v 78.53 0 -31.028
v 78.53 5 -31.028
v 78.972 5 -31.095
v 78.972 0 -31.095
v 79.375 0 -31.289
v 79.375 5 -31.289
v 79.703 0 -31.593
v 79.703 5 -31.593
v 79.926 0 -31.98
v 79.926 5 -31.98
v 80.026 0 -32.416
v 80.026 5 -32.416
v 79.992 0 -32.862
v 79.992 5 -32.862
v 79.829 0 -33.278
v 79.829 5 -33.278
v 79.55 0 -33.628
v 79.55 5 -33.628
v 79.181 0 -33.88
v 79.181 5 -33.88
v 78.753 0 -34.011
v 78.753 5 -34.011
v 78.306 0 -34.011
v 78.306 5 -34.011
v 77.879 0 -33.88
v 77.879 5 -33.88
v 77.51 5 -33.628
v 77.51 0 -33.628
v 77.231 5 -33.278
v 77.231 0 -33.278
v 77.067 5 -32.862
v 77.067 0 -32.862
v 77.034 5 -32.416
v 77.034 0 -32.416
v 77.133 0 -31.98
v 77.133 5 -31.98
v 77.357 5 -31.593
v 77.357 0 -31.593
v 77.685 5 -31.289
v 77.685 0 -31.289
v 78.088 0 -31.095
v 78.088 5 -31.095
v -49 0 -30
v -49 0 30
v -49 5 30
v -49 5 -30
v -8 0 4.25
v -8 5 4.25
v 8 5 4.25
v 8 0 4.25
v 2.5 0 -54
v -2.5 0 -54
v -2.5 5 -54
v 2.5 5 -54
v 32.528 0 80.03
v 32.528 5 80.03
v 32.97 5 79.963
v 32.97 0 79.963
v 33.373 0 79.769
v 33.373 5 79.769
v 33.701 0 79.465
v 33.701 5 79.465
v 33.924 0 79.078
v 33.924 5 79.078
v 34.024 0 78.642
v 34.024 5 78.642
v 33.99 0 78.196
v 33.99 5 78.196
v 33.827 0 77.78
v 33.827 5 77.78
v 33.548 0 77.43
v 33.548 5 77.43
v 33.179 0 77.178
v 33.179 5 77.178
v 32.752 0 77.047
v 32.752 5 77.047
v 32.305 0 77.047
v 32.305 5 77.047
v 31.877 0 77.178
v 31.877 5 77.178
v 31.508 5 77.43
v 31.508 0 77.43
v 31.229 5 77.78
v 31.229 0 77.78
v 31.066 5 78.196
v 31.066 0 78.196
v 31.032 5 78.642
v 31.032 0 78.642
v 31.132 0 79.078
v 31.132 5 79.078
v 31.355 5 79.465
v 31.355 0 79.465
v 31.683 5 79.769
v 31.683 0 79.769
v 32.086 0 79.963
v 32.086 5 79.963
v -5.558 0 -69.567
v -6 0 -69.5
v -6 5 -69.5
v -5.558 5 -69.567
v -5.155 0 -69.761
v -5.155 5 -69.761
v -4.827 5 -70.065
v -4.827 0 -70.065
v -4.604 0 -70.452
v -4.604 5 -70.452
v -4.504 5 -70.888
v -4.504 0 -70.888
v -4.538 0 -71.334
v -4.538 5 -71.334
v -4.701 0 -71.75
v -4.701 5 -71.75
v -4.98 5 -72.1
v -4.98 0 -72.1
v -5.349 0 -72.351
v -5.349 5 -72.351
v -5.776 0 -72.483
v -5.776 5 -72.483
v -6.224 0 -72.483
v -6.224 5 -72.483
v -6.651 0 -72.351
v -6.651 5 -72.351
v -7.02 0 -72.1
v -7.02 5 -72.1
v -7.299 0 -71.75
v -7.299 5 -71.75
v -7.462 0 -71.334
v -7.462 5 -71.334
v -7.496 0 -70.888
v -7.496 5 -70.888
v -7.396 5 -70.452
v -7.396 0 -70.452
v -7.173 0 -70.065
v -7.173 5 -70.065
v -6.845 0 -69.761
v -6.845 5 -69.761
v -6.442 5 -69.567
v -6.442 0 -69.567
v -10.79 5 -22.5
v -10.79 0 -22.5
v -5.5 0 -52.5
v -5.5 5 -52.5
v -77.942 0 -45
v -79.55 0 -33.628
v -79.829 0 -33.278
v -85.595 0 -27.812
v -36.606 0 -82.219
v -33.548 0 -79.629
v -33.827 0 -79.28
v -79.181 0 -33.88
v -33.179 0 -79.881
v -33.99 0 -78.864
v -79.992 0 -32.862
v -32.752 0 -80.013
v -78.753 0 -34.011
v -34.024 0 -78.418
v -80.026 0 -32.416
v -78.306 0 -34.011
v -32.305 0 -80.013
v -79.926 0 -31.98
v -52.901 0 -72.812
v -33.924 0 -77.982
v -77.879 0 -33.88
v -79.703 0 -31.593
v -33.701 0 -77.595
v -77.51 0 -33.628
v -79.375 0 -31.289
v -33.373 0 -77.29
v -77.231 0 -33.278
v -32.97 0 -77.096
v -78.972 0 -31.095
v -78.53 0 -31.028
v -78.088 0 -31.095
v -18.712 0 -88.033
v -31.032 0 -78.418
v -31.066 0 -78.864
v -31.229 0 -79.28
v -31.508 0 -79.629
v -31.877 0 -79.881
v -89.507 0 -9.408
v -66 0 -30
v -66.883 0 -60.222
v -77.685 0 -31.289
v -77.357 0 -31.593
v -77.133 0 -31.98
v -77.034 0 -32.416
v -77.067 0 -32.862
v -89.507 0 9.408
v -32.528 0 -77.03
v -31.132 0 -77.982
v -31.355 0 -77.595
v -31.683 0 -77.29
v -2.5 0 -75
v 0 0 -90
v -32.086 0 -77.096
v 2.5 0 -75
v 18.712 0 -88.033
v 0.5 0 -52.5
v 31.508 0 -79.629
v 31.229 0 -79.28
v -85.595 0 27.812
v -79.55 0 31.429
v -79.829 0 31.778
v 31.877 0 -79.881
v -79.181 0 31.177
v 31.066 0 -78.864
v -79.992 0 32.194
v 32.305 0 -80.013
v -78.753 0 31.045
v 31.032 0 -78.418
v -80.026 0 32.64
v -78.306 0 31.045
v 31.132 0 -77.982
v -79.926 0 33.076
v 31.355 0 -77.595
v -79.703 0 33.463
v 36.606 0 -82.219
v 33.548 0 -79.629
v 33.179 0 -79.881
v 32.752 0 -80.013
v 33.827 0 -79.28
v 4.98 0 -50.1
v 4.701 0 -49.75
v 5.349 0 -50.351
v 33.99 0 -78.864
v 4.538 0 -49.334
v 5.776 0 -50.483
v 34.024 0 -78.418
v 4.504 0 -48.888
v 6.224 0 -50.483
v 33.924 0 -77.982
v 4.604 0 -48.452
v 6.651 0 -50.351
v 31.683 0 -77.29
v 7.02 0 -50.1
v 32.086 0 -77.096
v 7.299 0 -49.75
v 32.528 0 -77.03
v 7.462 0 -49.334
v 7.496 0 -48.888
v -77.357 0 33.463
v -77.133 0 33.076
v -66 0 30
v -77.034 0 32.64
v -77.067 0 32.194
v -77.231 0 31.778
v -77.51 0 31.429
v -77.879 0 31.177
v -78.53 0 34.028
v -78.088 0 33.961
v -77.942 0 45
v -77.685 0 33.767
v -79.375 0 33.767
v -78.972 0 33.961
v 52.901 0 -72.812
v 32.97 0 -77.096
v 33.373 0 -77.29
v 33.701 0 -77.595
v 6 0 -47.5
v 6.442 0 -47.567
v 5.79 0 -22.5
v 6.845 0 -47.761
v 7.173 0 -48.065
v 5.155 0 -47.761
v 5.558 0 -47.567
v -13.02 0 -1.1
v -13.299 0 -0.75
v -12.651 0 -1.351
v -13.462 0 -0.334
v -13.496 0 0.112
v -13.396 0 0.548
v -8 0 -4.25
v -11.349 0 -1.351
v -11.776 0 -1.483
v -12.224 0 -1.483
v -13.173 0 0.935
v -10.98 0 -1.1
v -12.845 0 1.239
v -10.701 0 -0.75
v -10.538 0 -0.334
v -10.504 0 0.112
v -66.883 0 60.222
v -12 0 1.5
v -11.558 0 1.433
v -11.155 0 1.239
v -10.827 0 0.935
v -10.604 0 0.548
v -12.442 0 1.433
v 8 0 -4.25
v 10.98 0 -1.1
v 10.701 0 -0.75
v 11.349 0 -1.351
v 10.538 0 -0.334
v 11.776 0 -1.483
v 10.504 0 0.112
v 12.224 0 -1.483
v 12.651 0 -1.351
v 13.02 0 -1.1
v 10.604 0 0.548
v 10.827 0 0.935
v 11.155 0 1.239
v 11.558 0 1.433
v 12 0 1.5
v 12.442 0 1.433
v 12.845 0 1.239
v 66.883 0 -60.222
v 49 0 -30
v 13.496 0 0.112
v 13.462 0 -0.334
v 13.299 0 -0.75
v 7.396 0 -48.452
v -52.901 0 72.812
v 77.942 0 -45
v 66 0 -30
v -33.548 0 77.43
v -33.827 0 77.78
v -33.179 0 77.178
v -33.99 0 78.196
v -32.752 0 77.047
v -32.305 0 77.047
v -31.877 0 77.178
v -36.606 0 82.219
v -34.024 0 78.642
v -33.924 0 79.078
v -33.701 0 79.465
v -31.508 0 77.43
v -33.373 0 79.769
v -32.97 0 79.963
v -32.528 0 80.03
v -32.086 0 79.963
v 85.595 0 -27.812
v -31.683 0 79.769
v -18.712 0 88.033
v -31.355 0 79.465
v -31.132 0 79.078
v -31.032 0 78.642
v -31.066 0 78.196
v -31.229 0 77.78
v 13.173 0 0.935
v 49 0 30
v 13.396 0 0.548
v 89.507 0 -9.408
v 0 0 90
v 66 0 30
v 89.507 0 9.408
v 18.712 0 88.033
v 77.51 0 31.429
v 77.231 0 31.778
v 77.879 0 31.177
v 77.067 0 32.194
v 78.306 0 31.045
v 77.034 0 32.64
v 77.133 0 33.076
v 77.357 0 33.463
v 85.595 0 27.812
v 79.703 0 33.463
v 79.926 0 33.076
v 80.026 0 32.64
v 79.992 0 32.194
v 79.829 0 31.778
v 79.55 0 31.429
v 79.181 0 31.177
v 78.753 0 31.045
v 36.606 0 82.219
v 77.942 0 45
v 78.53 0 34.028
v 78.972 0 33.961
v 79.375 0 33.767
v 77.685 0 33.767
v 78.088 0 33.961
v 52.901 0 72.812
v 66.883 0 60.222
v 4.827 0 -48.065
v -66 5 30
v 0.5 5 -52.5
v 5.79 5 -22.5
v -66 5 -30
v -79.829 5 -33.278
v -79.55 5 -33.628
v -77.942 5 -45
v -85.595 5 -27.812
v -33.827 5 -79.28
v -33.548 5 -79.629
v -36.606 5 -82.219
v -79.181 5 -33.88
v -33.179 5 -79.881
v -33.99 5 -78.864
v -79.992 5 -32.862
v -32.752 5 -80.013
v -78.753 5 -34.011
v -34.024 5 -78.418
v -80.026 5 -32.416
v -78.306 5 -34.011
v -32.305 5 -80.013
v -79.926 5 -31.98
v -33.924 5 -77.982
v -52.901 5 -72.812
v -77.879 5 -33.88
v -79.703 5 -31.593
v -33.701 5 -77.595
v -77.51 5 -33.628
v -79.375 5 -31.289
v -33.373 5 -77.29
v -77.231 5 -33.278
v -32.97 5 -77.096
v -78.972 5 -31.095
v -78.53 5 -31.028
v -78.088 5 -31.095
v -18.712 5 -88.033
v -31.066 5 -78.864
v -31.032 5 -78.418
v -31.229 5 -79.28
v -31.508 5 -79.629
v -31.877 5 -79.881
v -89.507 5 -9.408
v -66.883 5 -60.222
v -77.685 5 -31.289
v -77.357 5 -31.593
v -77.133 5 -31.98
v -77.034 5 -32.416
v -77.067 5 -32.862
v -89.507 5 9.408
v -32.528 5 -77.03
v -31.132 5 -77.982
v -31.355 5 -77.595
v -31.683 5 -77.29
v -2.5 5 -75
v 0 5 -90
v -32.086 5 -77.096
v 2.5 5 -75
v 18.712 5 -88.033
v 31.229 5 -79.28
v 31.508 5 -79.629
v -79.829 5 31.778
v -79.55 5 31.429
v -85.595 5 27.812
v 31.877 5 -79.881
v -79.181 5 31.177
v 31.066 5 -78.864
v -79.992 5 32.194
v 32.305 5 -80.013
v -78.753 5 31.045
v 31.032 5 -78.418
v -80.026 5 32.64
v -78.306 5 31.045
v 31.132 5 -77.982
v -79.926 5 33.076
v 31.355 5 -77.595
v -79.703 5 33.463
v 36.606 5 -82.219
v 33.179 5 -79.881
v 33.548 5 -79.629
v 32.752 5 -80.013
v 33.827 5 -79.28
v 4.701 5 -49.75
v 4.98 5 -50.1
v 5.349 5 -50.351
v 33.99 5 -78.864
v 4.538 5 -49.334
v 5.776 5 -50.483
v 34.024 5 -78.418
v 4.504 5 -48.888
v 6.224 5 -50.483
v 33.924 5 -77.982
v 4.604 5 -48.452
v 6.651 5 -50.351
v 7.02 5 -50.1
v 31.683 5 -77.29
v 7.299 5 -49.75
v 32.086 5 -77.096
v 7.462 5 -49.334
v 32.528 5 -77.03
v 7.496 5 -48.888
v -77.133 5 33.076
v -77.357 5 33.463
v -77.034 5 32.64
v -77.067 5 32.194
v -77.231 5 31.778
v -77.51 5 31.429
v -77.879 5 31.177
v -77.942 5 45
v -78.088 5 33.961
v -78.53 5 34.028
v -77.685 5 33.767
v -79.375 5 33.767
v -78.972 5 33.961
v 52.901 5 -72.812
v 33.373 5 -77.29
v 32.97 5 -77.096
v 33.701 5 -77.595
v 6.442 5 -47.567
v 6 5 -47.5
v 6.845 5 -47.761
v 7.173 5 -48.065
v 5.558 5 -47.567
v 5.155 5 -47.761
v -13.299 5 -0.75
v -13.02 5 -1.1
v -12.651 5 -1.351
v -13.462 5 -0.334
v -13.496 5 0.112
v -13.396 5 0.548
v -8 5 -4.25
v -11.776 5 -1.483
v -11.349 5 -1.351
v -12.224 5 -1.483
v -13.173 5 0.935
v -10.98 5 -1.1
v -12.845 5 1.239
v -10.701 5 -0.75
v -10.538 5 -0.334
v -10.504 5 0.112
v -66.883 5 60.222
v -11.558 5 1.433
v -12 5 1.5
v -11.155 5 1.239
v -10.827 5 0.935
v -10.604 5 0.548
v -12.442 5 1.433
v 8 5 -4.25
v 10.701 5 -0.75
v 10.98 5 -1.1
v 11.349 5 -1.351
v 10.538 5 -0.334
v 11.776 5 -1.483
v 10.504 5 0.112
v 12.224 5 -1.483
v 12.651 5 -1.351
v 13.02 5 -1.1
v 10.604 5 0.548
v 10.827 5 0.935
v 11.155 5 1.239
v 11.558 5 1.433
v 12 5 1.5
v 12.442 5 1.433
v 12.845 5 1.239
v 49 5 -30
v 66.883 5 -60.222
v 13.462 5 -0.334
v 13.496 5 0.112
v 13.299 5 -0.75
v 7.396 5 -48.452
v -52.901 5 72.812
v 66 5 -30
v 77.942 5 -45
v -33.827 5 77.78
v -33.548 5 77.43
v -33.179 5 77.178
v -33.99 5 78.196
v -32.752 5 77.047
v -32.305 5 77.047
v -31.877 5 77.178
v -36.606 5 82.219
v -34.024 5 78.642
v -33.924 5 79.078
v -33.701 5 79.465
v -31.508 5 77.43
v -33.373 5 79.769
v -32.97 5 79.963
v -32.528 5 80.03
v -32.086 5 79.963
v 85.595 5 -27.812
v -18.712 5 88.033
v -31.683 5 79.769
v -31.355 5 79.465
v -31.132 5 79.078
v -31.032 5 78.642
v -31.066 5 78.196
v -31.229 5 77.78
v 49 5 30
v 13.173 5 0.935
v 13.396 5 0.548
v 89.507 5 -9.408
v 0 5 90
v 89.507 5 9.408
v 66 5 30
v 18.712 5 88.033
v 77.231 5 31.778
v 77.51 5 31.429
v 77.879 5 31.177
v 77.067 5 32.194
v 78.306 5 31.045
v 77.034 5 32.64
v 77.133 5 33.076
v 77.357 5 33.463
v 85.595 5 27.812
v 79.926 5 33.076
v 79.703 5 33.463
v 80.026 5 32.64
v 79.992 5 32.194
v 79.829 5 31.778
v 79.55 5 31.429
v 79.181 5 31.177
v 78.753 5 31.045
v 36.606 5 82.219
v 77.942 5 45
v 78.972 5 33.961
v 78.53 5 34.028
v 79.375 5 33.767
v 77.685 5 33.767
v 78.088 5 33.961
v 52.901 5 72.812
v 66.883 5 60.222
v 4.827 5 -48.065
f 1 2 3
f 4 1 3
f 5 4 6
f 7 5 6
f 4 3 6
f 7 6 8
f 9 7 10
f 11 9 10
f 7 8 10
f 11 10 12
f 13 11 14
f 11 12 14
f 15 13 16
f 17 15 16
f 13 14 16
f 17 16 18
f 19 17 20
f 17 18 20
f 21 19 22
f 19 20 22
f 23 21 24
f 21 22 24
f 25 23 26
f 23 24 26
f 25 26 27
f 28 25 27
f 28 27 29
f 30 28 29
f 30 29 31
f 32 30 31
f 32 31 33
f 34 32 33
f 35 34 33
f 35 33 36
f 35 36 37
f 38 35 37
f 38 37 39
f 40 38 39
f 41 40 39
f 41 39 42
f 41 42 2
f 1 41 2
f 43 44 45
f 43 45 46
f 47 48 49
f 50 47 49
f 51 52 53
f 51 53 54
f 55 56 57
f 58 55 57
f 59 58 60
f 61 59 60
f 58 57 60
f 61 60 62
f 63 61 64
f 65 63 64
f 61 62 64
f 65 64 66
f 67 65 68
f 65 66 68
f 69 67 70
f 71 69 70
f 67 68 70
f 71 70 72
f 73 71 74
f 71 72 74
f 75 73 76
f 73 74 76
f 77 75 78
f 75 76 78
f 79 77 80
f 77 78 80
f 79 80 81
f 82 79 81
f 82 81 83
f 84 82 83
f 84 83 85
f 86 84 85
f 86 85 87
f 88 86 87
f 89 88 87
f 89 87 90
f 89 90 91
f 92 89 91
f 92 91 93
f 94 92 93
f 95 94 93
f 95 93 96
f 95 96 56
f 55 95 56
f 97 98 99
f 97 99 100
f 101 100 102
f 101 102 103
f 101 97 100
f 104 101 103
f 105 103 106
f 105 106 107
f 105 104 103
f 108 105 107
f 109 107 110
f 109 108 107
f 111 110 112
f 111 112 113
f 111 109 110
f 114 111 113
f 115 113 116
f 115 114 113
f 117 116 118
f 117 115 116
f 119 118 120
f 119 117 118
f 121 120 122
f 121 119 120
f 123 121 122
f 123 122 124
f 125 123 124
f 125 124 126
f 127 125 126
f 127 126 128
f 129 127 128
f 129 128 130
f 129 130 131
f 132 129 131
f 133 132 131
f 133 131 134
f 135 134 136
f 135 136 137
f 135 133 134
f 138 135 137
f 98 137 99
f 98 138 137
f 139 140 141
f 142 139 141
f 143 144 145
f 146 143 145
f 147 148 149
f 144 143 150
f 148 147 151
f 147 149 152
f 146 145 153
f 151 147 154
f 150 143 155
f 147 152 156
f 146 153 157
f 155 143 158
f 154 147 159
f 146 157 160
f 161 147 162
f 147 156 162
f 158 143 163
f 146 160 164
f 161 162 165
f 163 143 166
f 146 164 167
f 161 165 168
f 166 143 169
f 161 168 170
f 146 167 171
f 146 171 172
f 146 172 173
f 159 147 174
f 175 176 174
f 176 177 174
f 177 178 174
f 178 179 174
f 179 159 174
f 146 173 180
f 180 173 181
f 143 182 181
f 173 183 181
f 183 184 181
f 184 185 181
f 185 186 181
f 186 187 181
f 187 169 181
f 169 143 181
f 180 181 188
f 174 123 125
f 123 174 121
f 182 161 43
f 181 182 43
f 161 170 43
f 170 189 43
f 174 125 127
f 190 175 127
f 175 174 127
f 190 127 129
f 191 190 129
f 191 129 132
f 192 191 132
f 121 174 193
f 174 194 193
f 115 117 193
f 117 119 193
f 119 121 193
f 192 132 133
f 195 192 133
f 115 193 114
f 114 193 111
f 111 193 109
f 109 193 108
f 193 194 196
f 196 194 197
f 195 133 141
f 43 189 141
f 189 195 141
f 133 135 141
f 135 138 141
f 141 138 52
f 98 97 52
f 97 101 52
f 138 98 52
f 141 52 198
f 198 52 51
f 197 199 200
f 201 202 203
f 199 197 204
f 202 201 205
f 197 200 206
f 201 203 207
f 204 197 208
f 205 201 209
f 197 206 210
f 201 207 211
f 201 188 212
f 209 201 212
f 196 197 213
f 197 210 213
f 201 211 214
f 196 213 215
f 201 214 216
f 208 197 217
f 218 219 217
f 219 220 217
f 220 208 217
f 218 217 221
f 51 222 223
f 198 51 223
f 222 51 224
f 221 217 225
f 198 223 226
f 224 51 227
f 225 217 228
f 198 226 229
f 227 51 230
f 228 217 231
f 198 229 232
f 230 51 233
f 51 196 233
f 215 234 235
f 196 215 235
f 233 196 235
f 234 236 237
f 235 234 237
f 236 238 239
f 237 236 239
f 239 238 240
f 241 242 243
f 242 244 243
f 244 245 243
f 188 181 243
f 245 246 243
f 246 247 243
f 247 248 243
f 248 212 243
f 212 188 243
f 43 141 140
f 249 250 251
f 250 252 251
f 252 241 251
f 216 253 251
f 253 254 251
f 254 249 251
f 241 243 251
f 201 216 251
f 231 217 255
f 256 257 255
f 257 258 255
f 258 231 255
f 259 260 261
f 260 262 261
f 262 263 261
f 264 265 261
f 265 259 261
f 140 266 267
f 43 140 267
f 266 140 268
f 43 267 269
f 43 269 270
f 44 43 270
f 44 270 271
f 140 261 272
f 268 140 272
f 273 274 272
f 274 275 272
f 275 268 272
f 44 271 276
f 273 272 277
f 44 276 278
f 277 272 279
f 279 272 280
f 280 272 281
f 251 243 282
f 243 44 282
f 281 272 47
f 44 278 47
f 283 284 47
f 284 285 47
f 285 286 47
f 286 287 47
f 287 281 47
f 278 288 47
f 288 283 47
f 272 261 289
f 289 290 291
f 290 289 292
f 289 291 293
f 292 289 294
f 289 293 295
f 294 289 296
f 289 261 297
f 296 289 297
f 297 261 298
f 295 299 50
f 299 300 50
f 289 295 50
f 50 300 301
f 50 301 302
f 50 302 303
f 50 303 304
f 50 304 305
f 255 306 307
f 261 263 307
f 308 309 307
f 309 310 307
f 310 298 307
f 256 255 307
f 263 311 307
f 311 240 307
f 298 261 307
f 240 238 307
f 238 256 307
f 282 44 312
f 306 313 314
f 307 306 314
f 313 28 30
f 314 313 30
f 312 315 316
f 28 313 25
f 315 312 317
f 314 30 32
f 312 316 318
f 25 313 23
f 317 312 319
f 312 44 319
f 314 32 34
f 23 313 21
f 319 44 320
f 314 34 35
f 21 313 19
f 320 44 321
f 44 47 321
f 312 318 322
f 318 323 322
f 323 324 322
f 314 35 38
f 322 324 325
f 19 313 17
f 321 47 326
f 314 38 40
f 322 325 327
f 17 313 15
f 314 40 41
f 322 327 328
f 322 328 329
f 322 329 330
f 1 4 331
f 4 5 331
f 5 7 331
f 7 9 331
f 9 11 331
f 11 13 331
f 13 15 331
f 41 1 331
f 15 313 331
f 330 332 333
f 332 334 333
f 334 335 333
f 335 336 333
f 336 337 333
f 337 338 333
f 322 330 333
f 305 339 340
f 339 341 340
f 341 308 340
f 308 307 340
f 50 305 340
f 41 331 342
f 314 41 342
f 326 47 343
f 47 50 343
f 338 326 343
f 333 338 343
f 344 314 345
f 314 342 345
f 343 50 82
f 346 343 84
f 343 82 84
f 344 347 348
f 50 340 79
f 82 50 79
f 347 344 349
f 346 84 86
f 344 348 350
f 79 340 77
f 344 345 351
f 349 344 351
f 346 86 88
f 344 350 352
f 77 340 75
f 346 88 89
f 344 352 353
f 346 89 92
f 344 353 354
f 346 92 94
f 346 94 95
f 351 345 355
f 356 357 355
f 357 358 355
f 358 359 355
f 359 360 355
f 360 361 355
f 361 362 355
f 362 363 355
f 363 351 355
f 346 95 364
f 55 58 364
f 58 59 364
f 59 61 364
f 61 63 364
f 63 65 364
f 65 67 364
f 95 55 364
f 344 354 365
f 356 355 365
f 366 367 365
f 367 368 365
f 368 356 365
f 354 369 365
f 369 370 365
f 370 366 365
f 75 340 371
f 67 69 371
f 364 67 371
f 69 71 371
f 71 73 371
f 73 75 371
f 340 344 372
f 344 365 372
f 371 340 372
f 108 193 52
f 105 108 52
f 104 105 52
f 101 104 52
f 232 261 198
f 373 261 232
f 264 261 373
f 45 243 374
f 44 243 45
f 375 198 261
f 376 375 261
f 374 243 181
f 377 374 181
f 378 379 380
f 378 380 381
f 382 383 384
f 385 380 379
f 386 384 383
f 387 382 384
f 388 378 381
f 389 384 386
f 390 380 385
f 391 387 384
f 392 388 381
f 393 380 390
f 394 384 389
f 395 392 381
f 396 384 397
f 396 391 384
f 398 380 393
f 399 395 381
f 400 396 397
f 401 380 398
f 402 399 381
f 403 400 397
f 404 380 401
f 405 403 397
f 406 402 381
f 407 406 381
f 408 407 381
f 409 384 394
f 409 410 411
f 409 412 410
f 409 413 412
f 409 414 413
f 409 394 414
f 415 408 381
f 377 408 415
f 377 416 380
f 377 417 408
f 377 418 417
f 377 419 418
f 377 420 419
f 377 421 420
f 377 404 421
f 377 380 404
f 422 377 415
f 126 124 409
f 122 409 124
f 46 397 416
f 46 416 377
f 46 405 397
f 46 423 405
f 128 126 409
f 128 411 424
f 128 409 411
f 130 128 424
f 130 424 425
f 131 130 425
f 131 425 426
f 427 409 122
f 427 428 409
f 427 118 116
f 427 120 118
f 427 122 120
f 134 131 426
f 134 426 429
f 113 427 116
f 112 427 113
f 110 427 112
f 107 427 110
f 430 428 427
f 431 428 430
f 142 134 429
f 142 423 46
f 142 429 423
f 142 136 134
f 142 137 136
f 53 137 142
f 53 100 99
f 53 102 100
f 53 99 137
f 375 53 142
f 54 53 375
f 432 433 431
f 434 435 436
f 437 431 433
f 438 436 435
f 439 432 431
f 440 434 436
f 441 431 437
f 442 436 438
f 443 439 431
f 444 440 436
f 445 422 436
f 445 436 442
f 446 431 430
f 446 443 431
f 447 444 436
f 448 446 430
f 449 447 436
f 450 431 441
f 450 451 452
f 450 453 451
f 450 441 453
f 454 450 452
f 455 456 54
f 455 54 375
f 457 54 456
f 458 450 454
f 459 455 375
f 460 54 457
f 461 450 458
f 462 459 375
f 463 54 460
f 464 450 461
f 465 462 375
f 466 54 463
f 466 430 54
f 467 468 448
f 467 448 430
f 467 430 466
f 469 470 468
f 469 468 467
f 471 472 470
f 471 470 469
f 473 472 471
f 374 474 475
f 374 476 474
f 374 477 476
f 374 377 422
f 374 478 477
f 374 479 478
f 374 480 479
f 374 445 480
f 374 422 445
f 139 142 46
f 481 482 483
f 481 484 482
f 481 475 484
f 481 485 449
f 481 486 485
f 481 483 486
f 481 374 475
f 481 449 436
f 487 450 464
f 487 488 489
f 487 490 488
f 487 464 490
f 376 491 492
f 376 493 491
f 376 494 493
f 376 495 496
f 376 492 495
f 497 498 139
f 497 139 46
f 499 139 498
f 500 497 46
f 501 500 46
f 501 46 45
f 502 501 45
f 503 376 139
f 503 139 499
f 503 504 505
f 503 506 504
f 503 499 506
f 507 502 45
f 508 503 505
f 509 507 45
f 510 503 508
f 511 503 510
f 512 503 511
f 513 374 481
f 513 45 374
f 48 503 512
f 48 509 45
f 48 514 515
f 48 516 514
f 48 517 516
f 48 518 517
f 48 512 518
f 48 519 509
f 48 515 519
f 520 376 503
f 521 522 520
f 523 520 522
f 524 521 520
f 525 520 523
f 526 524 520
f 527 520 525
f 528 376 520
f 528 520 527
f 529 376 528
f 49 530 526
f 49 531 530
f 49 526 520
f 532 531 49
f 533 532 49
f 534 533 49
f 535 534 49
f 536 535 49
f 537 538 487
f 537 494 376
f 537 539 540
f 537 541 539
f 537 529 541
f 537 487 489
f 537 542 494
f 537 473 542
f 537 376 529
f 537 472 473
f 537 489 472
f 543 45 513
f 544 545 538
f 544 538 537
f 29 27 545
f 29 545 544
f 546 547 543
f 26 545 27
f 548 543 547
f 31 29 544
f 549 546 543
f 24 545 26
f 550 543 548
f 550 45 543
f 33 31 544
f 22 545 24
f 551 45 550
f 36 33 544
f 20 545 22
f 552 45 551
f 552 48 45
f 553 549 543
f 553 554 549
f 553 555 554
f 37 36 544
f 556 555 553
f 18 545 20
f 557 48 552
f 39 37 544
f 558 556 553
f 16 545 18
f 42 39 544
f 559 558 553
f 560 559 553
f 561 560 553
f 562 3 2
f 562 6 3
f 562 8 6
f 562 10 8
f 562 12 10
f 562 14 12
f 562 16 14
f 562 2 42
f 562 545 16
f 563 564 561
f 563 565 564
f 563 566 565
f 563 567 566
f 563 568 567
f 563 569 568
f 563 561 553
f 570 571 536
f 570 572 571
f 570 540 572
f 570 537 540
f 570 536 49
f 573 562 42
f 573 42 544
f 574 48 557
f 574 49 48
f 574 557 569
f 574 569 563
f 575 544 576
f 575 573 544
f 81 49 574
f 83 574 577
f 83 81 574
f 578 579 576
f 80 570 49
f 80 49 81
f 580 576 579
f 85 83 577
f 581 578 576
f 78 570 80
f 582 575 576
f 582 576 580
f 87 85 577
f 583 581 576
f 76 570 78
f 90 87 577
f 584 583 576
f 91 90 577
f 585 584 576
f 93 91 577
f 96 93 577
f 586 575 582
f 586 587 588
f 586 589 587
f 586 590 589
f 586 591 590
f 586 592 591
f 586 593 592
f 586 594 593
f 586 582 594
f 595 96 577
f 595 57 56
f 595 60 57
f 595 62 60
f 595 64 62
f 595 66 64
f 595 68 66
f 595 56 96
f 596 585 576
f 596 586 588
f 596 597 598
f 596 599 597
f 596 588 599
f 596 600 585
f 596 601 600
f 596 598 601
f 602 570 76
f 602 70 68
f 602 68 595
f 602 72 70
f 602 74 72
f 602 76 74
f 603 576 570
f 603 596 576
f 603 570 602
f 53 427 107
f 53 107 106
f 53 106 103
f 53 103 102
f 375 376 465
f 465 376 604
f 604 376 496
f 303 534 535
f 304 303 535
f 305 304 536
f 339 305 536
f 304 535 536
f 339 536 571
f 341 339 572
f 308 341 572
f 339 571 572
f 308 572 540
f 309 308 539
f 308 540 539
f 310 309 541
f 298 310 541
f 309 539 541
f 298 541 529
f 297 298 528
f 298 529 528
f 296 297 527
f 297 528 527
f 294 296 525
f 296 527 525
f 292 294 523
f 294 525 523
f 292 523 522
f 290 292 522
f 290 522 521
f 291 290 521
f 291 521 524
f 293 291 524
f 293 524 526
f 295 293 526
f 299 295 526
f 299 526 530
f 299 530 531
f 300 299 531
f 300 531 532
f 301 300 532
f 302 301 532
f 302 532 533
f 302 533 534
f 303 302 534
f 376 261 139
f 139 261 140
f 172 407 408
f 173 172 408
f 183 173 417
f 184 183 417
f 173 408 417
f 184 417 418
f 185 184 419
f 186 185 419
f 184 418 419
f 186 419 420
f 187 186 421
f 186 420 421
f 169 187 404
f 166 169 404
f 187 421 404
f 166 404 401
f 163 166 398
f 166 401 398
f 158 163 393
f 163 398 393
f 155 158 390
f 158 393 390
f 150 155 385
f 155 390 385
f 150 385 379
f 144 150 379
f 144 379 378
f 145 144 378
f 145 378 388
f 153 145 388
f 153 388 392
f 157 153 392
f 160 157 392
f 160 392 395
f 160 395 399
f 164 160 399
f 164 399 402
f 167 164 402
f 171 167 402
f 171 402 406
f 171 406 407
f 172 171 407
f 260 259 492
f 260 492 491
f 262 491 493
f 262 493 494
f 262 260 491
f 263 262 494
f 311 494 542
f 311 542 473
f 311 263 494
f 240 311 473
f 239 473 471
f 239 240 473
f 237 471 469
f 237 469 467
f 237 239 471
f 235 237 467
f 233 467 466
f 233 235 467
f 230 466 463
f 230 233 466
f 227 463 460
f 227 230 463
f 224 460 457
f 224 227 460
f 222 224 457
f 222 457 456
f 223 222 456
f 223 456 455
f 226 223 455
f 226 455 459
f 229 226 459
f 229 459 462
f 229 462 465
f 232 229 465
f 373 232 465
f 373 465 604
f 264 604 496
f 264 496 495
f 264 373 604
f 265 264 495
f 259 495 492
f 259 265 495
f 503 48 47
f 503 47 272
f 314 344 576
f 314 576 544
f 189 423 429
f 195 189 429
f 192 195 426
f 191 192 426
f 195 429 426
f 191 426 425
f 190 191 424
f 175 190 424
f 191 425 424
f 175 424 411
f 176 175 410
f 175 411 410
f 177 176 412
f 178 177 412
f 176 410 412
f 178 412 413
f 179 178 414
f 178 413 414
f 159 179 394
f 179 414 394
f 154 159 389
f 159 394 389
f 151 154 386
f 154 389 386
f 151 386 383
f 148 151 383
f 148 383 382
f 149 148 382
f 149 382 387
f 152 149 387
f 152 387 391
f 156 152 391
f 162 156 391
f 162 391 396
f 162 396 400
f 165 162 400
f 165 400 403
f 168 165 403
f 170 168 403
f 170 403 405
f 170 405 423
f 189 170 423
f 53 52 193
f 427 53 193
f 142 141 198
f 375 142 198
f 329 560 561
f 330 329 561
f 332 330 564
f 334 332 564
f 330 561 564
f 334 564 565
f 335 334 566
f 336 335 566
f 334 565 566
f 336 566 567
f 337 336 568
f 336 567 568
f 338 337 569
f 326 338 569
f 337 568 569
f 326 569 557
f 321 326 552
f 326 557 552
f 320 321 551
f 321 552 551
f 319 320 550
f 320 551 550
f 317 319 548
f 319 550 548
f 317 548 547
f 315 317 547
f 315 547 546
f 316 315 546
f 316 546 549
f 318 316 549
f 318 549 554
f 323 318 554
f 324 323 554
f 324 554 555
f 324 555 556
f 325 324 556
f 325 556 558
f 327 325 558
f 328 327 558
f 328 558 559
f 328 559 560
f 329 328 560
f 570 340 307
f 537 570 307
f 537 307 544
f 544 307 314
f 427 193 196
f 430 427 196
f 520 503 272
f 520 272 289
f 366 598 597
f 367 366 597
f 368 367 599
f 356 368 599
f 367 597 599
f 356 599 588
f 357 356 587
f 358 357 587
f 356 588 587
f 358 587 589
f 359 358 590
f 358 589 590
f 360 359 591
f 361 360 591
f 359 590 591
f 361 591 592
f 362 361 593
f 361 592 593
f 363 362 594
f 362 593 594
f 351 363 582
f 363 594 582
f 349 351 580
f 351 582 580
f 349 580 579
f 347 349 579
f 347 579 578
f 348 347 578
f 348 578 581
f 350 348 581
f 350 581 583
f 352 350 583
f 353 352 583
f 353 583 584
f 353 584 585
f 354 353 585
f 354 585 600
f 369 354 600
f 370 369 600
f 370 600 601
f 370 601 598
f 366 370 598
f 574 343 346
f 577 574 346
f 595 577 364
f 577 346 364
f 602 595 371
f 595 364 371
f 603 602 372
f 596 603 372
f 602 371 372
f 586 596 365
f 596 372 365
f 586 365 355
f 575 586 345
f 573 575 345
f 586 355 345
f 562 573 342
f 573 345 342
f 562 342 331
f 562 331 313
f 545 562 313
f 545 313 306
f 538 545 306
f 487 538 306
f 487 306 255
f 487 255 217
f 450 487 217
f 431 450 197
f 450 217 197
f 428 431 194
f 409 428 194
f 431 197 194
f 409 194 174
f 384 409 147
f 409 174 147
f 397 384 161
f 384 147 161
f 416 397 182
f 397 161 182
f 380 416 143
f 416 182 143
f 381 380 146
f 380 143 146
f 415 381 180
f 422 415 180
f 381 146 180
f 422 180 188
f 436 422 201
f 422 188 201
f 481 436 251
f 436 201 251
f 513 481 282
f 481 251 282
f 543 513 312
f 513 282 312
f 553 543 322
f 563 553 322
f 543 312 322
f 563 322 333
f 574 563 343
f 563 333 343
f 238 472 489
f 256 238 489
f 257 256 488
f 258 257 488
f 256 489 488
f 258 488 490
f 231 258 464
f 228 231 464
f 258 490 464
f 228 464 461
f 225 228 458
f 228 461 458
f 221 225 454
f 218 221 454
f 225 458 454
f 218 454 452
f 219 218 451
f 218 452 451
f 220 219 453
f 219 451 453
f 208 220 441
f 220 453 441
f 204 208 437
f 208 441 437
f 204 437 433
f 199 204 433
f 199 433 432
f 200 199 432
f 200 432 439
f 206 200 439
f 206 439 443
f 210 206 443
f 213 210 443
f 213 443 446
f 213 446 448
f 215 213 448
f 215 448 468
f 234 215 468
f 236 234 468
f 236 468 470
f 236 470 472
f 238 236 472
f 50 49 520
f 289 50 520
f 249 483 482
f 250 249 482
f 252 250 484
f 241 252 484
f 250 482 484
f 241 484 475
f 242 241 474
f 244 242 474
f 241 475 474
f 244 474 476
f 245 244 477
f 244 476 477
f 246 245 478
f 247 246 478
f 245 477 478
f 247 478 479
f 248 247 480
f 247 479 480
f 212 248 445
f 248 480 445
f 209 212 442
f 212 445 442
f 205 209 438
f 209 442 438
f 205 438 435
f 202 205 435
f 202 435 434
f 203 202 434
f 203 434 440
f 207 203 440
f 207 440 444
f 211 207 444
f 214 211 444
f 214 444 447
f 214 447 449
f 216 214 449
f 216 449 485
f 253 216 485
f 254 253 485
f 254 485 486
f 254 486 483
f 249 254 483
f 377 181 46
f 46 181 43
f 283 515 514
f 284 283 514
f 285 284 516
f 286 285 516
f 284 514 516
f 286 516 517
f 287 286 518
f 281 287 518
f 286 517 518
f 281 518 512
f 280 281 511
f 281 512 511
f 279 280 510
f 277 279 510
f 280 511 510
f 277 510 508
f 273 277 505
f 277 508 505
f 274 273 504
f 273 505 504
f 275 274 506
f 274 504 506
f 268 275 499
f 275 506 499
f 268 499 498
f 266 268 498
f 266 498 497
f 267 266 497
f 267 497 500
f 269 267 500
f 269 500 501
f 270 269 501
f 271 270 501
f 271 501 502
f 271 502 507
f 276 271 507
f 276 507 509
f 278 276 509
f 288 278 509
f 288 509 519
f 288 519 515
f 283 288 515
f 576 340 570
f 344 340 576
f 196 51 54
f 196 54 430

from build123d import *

# Parameters (mm, degrees)
SKETCH1_R           = 90
SKETCH1_R_2         = 1.5
SKETCH1_W           = 17
SKETCH1_H           = 60
SKETCH1_W_2         = 5
SKETCH1_H_2         = 21
BOSS_EXTRUDE1_DEPTH = 5
SKETCH3_R           = 1.5
OUTER_SCREWS_DEPTH  = 10
SKETCH2_R           = 1.5
SKETCH2_W           = 16
SKETCH2_H           = 8.5
SAFETY_LINK_DEPTH   = 10


with BuildPart() as part:
    # Sketch1 → Boss-Extrude1 (new body)
    with BuildSketch(Plane(origin=(0, 0, 0), x_dir=(1, 0, 0), z_dir=(0, 1, 0))):
        with Locations(Location((0, 0, 0), (0, 0, 270))):
            Circle(SKETCH1_R)
        with Locations(Location((-6, 71, 0), (0, 0, 270))):
            Circle(SKETCH1_R_2, mode=Mode.SUBTRACT)
        with Locations(Location((6, 49, 0), (0, 0, 270))):
            Circle(SKETCH1_R_2, mode=Mode.SUBTRACT)
        with Locations((-57.5, 0)):
            Rectangle(SKETCH1_W, SKETCH1_H, mode=Mode.SUBTRACT)
        with Locations((57.5, 0)):
            Rectangle(SKETCH1_W, SKETCH1_H, mode=Mode.SUBTRACT)
        with Locations((0, 64.5)):
            Rectangle(SKETCH1_W_2, SKETCH1_H_2, mode=Mode.SUBTRACT)
        Polygon((-5.5, 52.5), (0.5, 52.5), (5.789809421, 22.5), (-10.789809421, 22.5), align=None, mode=Mode.SUBTRACT)
    extrude(amount=BOSS_EXTRUDE1_DEPTH)

    # Sketch3 → Outer Screws (cut)
    with BuildSketch(Plane(origin=(0, 5, 0), x_dir=(1, 0, 0), z_dir=(0, 1, 0))):
        with Locations(Location((32.528091751, 78.529760263, 0), (0, 0, 270))):
            Circle(SKETCH3_R)
        with Locations(Location((78.529760263, 32.528091751, 0), (0, 0, 270))):
            Circle(SKETCH3_R)
        with Locations(Location((78.529760263, -32.528091751, 0), (0, 0, 270))):
            Circle(SKETCH3_R)
        with Locations(Location((32.528091751, -78.529760263, 0), (0, 0, 270))):
            Circle(SKETCH3_R)
        with Locations(Location((-32.528091751, -78.529760263, 0), (0, 0, 270))):
            Circle(SKETCH3_R)
        with Locations(Location((-78.529760263, -32.528091751, 0), (0, 0, 270))):
            Circle(SKETCH3_R)
        with Locations(Location((-78.529760263, 32.528091751, 0), (0, 0, 270))):
            Circle(SKETCH3_R)
        with Locations(Location((-32.528091751, 78.529760263, 0), (0, 0, 270))):
            Circle(SKETCH3_R)
    extrude(amount=-OUTER_SCREWS_DEPTH, mode=Mode.SUBTRACT)

    # Sketch2 → Safety Link (cut)
    with BuildSketch(Plane(origin=(0, 5, 0), x_dir=(1, 0, 0), z_dir=(0, 1, 0))):
        with Locations(Location((-12, 0, 0), (0, 0, 270))):
            Circle(SKETCH2_R)
        with Locations(Location((12, 0, 0), (0, 0, 270))):
            Circle(SKETCH2_R)
        Rectangle(SKETCH2_W, SKETCH2_H)
    extrude(amount=-SAFETY_LINK_DEPTH, mode=Mode.SUBTRACT)


solid = part.part
